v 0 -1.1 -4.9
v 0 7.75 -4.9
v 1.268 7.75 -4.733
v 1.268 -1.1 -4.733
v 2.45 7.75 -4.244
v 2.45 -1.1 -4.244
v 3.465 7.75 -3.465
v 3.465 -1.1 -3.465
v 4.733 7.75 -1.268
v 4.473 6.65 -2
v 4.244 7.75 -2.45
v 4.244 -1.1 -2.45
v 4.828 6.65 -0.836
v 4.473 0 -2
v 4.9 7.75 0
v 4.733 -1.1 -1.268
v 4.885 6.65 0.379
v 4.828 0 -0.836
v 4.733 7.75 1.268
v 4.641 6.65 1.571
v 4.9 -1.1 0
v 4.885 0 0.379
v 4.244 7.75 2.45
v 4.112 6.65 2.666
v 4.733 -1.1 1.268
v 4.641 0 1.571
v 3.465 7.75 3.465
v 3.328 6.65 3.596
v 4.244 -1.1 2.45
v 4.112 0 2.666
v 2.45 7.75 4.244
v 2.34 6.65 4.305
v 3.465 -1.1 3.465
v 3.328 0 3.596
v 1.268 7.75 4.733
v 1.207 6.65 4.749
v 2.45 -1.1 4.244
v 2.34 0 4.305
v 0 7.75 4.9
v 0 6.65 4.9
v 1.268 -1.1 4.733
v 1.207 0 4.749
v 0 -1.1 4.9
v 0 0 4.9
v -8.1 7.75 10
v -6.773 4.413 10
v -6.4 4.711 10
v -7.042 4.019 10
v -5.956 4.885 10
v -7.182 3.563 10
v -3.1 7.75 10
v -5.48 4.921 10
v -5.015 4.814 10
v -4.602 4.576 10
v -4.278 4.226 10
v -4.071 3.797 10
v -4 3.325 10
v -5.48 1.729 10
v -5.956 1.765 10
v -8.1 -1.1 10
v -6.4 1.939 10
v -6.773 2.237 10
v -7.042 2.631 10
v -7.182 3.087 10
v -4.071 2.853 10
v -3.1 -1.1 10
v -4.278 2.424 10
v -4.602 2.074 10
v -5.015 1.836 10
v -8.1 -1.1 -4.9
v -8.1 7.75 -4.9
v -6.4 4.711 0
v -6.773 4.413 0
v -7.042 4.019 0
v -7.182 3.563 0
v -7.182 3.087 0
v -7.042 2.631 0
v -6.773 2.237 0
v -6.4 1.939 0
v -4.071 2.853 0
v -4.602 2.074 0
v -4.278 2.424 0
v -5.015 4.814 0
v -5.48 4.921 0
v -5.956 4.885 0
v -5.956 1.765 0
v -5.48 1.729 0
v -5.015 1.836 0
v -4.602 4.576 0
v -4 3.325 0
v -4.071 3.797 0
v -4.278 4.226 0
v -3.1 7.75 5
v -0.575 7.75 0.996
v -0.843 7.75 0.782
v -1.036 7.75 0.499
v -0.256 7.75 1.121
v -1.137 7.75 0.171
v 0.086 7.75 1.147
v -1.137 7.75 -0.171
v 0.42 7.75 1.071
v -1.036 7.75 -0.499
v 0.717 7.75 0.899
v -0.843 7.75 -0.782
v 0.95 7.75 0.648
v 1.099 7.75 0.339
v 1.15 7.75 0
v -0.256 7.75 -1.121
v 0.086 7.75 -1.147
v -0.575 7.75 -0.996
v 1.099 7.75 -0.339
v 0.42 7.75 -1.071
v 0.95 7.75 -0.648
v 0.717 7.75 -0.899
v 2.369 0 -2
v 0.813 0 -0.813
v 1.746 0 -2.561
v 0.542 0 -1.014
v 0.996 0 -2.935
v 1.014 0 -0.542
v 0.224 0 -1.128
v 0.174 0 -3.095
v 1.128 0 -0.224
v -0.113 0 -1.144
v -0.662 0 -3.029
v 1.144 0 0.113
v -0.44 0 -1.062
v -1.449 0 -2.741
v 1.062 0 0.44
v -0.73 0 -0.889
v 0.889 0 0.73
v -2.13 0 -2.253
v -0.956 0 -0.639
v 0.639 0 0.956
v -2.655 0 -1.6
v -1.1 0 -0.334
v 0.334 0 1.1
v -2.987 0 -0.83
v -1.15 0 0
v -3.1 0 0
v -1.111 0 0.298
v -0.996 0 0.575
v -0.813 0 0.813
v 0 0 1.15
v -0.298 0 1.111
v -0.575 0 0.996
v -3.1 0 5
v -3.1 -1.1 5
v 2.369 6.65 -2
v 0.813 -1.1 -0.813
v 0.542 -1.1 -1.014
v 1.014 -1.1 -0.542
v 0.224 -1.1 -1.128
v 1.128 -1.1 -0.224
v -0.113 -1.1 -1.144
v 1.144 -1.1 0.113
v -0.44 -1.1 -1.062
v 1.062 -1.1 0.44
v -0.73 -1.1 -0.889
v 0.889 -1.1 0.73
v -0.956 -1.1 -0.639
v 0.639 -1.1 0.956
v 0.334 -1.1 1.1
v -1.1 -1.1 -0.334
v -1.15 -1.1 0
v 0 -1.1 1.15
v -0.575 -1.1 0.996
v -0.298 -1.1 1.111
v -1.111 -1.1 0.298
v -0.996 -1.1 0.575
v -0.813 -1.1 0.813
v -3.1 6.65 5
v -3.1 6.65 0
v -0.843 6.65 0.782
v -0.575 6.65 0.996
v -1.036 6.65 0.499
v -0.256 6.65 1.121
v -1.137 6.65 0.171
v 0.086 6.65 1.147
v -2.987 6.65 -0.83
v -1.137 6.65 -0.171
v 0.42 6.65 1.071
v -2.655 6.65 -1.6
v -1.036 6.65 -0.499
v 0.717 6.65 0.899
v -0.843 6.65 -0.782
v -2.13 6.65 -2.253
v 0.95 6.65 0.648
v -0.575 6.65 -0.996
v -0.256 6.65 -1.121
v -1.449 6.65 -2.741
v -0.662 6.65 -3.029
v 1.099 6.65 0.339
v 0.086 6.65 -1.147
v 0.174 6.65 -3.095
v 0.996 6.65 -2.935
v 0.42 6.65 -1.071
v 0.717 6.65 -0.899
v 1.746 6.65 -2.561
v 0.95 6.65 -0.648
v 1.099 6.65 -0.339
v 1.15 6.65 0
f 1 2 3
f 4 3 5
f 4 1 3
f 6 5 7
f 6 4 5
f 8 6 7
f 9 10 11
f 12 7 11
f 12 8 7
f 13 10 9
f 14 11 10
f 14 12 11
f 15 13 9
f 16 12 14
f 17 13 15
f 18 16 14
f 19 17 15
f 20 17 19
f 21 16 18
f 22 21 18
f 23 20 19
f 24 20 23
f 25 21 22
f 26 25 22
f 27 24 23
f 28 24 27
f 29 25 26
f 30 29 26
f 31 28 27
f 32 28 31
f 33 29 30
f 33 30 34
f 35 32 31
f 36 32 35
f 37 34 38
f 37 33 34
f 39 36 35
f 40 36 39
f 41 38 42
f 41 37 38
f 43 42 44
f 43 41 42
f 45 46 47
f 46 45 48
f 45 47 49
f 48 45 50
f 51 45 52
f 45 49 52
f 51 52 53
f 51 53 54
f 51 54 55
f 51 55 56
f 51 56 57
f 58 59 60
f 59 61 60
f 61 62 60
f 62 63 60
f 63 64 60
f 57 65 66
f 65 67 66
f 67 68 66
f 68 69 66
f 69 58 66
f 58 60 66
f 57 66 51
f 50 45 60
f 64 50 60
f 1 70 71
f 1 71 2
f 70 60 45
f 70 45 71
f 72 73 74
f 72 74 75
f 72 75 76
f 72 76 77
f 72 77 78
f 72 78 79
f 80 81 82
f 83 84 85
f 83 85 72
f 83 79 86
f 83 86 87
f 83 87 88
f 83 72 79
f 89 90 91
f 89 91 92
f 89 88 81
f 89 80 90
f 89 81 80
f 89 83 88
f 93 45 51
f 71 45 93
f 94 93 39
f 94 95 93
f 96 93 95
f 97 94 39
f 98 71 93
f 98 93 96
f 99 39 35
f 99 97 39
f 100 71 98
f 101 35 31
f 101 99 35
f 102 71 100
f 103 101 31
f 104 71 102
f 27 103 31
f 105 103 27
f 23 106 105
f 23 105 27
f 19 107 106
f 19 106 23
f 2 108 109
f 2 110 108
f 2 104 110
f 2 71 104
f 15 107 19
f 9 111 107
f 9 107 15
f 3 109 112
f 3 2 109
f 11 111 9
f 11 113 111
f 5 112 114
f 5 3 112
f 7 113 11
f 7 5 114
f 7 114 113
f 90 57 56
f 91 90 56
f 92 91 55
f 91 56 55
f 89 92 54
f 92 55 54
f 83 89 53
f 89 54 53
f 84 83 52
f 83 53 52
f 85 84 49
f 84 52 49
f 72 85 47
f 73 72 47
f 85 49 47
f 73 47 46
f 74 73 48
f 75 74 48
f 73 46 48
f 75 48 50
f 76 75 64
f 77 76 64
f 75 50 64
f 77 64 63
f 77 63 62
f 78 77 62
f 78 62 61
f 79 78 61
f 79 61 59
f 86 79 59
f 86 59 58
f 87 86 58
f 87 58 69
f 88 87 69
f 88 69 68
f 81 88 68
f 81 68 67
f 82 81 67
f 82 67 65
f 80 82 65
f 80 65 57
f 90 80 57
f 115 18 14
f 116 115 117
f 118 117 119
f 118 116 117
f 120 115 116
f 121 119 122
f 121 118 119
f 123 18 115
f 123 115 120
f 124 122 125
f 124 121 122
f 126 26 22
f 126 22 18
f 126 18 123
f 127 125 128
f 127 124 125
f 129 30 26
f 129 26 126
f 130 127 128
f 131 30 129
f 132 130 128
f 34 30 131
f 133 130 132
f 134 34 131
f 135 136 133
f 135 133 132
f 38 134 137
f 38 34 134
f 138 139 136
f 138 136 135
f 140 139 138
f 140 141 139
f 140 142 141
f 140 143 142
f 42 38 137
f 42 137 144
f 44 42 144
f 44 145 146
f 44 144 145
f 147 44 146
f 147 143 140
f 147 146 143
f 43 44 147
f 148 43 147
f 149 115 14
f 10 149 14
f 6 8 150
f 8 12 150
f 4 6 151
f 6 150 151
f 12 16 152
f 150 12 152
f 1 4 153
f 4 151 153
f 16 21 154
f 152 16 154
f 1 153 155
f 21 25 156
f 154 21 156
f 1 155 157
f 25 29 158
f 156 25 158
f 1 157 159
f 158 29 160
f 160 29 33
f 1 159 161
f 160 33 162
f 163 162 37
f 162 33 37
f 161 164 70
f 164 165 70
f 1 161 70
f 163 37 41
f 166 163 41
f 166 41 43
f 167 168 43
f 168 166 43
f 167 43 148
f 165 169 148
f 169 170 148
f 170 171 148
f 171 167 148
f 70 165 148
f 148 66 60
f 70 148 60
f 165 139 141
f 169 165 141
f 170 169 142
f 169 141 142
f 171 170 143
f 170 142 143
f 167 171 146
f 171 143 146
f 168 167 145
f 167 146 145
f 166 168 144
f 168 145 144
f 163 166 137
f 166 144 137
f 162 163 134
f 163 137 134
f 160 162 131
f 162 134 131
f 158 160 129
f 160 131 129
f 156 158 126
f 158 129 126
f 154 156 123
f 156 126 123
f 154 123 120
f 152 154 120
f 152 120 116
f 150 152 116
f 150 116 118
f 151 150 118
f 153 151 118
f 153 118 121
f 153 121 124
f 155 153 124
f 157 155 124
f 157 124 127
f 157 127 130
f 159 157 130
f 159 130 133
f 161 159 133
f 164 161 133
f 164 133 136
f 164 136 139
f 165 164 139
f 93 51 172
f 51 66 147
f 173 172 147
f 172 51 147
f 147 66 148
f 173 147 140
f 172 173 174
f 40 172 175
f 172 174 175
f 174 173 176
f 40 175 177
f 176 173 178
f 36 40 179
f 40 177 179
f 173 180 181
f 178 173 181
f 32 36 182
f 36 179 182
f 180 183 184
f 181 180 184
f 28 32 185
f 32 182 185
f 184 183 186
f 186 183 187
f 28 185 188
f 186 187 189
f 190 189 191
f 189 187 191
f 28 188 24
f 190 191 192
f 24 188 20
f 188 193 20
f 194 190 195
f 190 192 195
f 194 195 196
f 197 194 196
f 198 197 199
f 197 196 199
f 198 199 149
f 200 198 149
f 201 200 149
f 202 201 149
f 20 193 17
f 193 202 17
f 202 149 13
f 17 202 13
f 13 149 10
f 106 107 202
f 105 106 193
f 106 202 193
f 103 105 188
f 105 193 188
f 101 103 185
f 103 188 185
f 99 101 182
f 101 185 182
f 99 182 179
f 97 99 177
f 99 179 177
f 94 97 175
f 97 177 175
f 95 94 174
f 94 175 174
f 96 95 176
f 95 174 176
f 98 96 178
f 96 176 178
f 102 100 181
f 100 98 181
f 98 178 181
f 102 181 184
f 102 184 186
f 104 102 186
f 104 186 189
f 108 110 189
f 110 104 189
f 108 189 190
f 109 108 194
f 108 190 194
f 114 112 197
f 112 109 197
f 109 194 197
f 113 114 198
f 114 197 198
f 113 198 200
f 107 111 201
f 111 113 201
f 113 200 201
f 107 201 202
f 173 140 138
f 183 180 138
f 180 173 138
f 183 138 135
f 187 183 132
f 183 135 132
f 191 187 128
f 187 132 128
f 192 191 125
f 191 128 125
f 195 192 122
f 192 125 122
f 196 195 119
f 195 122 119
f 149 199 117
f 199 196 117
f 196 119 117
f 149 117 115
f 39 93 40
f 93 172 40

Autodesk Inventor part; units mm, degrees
ref_plane "YZ Plane" through (0, 0, 0) normal (1, 0, 0) x (0, 1, 0)
ref_plane "XZ Plane" through (0, 0, 0) normal (0, 1, 0) x (-1, 0, 0)
ref_plane "XY Plane" through (0, 0, 0) normal (0, 0, 1) x (1, 0, 0)
sketch "スケッチ1" plane through (0, 0, 0) normal (0, 1, 0) x (-1, 0, 0)
  circle A0 centre (0, 0) radius 1.15
  circle A1 centre (0, 0) radius 3.1
  circle A2 centre (0, 0) radius 4.9
  line L0 (3.1, 0) -> (8.1, 0)
  line L1 (8.1, 0) -> (8.1, 10)
  line L2 (8.1, 10) -> (3.1, 10)
  line L3 (3.1, 10) -> (3.1, 0)
  line L4 (0, 0) -> (0, 4.9)
  line L5 (0, 4.9) -> (3.1, 5)
  line L6 (8.1, 0) -> (2.9642, -3.9017)
  circle A3 centre (0, 0) radius 2
  line L7 (0, -2) -> (-4.4733, -2)
  line L8 (8.1, 0) -> (8.1, -4.9)
  line L9 (8.1, -4.9) -> (0, -4.9)
  point P0 (-2.3685, -2)
  dimension "d1" = 6.2
  dimension "d5" = 4
  dimension "d0" = 2.3
  dimension "d2" = 9.8
  dimension "d3" = 5
  dimension "d4" = 10
extrude "押し出し1" add sketch "スケッチ1" along normal blind 6.65 contours L0 A2 L7 A1 | L3 A2 L0 | L0 L6 A2 | A2 L3 L2 L1 L0 | L6 L8 L9 A2
extrude "押し出し2" add sketch "スケッチ1" against normal blind 1.1
sketch "スケッチ2" plane through (0, 6.65, 0) normal (0, 1, 0) x (1, 0, 0)
  circle A0 centre (0, 0) radius 1.15 projected
  circle A1 centre (0, 0) radius 1.15
  arc A2 (2.3685, 2) -> (-3.1, 0) centre (0, 0) ccw projected
  circle A3 centre (0, 0) radius 4.9
  line L0 (-8.1, -10) -> (-8.1, 4.9) projected
  line L1 (-3.1, 0) -> (-8.1, 0)
  line L2 (-8.1, 0) -> (-8.1, -10)
  line L3 (-8.1, -10) -> (-3.1, -10)
  line L4 (-3.1, -10) -> (-3.1, 0)
  line L5 (-3.1, -5) -> (0, -4.9) projected
  line L6 (0, -4.9) -> (-3.1, -5)
  line L7 (-3.1, -5) -> (-3.1, 0)
  line L8 (0, 0) -> (-8.1, 0)
  line L9 (-8.1, 0) -> (-8.1, 4.9)
  line L10 (-8.1, 4.9) -> (0, 4.9)
  line L11 (0, 4.9) -> (0, 0)
  dimension "d11" = 9.8
  dimension "d10" = 2.3
  dimension "d12" = 5
  dimension "d13" = 10
extrude "押し出し3" add sketch "スケッチ2" along normal blind 1.1 contours A0 L11 A3 L4 L8 | A0 L8 A2 L11 | A2 L1 A3 L11 | L4 A3 L1 | A3 L1 L0 L10 | A3 L4 L3 L0 L1 | A3 L5 L4
sketch "スケッチ3" plane through (-8.1, -1.1, 10) normal (0, 0, 1) x (1, 0, 0)
  line L0 (0, 0) -> (8.1, 0) projected
  line L1 (0, 0) -> (2.5, 0)
  line L2 (2.5, 0) -> (2.5, 4.425)
  line L3 (2.5, 4.425) -> (0, 4.425)
  line L4 (0, 4.425) -> (0, 0)
  circle A0 centre (2.5, 4.425) radius 1.6
  point P0 (8.1, 1.1)
  dimension "d16" = 2.5
  dimension "d17" = 4.425
  dimension "d18" = 3.2
extrude "押し出し4" cut sketch "スケッチ3" against normal blind 10 contours A0 L3 L2 | L2 L3 A0
properties part number "srod2.1"
